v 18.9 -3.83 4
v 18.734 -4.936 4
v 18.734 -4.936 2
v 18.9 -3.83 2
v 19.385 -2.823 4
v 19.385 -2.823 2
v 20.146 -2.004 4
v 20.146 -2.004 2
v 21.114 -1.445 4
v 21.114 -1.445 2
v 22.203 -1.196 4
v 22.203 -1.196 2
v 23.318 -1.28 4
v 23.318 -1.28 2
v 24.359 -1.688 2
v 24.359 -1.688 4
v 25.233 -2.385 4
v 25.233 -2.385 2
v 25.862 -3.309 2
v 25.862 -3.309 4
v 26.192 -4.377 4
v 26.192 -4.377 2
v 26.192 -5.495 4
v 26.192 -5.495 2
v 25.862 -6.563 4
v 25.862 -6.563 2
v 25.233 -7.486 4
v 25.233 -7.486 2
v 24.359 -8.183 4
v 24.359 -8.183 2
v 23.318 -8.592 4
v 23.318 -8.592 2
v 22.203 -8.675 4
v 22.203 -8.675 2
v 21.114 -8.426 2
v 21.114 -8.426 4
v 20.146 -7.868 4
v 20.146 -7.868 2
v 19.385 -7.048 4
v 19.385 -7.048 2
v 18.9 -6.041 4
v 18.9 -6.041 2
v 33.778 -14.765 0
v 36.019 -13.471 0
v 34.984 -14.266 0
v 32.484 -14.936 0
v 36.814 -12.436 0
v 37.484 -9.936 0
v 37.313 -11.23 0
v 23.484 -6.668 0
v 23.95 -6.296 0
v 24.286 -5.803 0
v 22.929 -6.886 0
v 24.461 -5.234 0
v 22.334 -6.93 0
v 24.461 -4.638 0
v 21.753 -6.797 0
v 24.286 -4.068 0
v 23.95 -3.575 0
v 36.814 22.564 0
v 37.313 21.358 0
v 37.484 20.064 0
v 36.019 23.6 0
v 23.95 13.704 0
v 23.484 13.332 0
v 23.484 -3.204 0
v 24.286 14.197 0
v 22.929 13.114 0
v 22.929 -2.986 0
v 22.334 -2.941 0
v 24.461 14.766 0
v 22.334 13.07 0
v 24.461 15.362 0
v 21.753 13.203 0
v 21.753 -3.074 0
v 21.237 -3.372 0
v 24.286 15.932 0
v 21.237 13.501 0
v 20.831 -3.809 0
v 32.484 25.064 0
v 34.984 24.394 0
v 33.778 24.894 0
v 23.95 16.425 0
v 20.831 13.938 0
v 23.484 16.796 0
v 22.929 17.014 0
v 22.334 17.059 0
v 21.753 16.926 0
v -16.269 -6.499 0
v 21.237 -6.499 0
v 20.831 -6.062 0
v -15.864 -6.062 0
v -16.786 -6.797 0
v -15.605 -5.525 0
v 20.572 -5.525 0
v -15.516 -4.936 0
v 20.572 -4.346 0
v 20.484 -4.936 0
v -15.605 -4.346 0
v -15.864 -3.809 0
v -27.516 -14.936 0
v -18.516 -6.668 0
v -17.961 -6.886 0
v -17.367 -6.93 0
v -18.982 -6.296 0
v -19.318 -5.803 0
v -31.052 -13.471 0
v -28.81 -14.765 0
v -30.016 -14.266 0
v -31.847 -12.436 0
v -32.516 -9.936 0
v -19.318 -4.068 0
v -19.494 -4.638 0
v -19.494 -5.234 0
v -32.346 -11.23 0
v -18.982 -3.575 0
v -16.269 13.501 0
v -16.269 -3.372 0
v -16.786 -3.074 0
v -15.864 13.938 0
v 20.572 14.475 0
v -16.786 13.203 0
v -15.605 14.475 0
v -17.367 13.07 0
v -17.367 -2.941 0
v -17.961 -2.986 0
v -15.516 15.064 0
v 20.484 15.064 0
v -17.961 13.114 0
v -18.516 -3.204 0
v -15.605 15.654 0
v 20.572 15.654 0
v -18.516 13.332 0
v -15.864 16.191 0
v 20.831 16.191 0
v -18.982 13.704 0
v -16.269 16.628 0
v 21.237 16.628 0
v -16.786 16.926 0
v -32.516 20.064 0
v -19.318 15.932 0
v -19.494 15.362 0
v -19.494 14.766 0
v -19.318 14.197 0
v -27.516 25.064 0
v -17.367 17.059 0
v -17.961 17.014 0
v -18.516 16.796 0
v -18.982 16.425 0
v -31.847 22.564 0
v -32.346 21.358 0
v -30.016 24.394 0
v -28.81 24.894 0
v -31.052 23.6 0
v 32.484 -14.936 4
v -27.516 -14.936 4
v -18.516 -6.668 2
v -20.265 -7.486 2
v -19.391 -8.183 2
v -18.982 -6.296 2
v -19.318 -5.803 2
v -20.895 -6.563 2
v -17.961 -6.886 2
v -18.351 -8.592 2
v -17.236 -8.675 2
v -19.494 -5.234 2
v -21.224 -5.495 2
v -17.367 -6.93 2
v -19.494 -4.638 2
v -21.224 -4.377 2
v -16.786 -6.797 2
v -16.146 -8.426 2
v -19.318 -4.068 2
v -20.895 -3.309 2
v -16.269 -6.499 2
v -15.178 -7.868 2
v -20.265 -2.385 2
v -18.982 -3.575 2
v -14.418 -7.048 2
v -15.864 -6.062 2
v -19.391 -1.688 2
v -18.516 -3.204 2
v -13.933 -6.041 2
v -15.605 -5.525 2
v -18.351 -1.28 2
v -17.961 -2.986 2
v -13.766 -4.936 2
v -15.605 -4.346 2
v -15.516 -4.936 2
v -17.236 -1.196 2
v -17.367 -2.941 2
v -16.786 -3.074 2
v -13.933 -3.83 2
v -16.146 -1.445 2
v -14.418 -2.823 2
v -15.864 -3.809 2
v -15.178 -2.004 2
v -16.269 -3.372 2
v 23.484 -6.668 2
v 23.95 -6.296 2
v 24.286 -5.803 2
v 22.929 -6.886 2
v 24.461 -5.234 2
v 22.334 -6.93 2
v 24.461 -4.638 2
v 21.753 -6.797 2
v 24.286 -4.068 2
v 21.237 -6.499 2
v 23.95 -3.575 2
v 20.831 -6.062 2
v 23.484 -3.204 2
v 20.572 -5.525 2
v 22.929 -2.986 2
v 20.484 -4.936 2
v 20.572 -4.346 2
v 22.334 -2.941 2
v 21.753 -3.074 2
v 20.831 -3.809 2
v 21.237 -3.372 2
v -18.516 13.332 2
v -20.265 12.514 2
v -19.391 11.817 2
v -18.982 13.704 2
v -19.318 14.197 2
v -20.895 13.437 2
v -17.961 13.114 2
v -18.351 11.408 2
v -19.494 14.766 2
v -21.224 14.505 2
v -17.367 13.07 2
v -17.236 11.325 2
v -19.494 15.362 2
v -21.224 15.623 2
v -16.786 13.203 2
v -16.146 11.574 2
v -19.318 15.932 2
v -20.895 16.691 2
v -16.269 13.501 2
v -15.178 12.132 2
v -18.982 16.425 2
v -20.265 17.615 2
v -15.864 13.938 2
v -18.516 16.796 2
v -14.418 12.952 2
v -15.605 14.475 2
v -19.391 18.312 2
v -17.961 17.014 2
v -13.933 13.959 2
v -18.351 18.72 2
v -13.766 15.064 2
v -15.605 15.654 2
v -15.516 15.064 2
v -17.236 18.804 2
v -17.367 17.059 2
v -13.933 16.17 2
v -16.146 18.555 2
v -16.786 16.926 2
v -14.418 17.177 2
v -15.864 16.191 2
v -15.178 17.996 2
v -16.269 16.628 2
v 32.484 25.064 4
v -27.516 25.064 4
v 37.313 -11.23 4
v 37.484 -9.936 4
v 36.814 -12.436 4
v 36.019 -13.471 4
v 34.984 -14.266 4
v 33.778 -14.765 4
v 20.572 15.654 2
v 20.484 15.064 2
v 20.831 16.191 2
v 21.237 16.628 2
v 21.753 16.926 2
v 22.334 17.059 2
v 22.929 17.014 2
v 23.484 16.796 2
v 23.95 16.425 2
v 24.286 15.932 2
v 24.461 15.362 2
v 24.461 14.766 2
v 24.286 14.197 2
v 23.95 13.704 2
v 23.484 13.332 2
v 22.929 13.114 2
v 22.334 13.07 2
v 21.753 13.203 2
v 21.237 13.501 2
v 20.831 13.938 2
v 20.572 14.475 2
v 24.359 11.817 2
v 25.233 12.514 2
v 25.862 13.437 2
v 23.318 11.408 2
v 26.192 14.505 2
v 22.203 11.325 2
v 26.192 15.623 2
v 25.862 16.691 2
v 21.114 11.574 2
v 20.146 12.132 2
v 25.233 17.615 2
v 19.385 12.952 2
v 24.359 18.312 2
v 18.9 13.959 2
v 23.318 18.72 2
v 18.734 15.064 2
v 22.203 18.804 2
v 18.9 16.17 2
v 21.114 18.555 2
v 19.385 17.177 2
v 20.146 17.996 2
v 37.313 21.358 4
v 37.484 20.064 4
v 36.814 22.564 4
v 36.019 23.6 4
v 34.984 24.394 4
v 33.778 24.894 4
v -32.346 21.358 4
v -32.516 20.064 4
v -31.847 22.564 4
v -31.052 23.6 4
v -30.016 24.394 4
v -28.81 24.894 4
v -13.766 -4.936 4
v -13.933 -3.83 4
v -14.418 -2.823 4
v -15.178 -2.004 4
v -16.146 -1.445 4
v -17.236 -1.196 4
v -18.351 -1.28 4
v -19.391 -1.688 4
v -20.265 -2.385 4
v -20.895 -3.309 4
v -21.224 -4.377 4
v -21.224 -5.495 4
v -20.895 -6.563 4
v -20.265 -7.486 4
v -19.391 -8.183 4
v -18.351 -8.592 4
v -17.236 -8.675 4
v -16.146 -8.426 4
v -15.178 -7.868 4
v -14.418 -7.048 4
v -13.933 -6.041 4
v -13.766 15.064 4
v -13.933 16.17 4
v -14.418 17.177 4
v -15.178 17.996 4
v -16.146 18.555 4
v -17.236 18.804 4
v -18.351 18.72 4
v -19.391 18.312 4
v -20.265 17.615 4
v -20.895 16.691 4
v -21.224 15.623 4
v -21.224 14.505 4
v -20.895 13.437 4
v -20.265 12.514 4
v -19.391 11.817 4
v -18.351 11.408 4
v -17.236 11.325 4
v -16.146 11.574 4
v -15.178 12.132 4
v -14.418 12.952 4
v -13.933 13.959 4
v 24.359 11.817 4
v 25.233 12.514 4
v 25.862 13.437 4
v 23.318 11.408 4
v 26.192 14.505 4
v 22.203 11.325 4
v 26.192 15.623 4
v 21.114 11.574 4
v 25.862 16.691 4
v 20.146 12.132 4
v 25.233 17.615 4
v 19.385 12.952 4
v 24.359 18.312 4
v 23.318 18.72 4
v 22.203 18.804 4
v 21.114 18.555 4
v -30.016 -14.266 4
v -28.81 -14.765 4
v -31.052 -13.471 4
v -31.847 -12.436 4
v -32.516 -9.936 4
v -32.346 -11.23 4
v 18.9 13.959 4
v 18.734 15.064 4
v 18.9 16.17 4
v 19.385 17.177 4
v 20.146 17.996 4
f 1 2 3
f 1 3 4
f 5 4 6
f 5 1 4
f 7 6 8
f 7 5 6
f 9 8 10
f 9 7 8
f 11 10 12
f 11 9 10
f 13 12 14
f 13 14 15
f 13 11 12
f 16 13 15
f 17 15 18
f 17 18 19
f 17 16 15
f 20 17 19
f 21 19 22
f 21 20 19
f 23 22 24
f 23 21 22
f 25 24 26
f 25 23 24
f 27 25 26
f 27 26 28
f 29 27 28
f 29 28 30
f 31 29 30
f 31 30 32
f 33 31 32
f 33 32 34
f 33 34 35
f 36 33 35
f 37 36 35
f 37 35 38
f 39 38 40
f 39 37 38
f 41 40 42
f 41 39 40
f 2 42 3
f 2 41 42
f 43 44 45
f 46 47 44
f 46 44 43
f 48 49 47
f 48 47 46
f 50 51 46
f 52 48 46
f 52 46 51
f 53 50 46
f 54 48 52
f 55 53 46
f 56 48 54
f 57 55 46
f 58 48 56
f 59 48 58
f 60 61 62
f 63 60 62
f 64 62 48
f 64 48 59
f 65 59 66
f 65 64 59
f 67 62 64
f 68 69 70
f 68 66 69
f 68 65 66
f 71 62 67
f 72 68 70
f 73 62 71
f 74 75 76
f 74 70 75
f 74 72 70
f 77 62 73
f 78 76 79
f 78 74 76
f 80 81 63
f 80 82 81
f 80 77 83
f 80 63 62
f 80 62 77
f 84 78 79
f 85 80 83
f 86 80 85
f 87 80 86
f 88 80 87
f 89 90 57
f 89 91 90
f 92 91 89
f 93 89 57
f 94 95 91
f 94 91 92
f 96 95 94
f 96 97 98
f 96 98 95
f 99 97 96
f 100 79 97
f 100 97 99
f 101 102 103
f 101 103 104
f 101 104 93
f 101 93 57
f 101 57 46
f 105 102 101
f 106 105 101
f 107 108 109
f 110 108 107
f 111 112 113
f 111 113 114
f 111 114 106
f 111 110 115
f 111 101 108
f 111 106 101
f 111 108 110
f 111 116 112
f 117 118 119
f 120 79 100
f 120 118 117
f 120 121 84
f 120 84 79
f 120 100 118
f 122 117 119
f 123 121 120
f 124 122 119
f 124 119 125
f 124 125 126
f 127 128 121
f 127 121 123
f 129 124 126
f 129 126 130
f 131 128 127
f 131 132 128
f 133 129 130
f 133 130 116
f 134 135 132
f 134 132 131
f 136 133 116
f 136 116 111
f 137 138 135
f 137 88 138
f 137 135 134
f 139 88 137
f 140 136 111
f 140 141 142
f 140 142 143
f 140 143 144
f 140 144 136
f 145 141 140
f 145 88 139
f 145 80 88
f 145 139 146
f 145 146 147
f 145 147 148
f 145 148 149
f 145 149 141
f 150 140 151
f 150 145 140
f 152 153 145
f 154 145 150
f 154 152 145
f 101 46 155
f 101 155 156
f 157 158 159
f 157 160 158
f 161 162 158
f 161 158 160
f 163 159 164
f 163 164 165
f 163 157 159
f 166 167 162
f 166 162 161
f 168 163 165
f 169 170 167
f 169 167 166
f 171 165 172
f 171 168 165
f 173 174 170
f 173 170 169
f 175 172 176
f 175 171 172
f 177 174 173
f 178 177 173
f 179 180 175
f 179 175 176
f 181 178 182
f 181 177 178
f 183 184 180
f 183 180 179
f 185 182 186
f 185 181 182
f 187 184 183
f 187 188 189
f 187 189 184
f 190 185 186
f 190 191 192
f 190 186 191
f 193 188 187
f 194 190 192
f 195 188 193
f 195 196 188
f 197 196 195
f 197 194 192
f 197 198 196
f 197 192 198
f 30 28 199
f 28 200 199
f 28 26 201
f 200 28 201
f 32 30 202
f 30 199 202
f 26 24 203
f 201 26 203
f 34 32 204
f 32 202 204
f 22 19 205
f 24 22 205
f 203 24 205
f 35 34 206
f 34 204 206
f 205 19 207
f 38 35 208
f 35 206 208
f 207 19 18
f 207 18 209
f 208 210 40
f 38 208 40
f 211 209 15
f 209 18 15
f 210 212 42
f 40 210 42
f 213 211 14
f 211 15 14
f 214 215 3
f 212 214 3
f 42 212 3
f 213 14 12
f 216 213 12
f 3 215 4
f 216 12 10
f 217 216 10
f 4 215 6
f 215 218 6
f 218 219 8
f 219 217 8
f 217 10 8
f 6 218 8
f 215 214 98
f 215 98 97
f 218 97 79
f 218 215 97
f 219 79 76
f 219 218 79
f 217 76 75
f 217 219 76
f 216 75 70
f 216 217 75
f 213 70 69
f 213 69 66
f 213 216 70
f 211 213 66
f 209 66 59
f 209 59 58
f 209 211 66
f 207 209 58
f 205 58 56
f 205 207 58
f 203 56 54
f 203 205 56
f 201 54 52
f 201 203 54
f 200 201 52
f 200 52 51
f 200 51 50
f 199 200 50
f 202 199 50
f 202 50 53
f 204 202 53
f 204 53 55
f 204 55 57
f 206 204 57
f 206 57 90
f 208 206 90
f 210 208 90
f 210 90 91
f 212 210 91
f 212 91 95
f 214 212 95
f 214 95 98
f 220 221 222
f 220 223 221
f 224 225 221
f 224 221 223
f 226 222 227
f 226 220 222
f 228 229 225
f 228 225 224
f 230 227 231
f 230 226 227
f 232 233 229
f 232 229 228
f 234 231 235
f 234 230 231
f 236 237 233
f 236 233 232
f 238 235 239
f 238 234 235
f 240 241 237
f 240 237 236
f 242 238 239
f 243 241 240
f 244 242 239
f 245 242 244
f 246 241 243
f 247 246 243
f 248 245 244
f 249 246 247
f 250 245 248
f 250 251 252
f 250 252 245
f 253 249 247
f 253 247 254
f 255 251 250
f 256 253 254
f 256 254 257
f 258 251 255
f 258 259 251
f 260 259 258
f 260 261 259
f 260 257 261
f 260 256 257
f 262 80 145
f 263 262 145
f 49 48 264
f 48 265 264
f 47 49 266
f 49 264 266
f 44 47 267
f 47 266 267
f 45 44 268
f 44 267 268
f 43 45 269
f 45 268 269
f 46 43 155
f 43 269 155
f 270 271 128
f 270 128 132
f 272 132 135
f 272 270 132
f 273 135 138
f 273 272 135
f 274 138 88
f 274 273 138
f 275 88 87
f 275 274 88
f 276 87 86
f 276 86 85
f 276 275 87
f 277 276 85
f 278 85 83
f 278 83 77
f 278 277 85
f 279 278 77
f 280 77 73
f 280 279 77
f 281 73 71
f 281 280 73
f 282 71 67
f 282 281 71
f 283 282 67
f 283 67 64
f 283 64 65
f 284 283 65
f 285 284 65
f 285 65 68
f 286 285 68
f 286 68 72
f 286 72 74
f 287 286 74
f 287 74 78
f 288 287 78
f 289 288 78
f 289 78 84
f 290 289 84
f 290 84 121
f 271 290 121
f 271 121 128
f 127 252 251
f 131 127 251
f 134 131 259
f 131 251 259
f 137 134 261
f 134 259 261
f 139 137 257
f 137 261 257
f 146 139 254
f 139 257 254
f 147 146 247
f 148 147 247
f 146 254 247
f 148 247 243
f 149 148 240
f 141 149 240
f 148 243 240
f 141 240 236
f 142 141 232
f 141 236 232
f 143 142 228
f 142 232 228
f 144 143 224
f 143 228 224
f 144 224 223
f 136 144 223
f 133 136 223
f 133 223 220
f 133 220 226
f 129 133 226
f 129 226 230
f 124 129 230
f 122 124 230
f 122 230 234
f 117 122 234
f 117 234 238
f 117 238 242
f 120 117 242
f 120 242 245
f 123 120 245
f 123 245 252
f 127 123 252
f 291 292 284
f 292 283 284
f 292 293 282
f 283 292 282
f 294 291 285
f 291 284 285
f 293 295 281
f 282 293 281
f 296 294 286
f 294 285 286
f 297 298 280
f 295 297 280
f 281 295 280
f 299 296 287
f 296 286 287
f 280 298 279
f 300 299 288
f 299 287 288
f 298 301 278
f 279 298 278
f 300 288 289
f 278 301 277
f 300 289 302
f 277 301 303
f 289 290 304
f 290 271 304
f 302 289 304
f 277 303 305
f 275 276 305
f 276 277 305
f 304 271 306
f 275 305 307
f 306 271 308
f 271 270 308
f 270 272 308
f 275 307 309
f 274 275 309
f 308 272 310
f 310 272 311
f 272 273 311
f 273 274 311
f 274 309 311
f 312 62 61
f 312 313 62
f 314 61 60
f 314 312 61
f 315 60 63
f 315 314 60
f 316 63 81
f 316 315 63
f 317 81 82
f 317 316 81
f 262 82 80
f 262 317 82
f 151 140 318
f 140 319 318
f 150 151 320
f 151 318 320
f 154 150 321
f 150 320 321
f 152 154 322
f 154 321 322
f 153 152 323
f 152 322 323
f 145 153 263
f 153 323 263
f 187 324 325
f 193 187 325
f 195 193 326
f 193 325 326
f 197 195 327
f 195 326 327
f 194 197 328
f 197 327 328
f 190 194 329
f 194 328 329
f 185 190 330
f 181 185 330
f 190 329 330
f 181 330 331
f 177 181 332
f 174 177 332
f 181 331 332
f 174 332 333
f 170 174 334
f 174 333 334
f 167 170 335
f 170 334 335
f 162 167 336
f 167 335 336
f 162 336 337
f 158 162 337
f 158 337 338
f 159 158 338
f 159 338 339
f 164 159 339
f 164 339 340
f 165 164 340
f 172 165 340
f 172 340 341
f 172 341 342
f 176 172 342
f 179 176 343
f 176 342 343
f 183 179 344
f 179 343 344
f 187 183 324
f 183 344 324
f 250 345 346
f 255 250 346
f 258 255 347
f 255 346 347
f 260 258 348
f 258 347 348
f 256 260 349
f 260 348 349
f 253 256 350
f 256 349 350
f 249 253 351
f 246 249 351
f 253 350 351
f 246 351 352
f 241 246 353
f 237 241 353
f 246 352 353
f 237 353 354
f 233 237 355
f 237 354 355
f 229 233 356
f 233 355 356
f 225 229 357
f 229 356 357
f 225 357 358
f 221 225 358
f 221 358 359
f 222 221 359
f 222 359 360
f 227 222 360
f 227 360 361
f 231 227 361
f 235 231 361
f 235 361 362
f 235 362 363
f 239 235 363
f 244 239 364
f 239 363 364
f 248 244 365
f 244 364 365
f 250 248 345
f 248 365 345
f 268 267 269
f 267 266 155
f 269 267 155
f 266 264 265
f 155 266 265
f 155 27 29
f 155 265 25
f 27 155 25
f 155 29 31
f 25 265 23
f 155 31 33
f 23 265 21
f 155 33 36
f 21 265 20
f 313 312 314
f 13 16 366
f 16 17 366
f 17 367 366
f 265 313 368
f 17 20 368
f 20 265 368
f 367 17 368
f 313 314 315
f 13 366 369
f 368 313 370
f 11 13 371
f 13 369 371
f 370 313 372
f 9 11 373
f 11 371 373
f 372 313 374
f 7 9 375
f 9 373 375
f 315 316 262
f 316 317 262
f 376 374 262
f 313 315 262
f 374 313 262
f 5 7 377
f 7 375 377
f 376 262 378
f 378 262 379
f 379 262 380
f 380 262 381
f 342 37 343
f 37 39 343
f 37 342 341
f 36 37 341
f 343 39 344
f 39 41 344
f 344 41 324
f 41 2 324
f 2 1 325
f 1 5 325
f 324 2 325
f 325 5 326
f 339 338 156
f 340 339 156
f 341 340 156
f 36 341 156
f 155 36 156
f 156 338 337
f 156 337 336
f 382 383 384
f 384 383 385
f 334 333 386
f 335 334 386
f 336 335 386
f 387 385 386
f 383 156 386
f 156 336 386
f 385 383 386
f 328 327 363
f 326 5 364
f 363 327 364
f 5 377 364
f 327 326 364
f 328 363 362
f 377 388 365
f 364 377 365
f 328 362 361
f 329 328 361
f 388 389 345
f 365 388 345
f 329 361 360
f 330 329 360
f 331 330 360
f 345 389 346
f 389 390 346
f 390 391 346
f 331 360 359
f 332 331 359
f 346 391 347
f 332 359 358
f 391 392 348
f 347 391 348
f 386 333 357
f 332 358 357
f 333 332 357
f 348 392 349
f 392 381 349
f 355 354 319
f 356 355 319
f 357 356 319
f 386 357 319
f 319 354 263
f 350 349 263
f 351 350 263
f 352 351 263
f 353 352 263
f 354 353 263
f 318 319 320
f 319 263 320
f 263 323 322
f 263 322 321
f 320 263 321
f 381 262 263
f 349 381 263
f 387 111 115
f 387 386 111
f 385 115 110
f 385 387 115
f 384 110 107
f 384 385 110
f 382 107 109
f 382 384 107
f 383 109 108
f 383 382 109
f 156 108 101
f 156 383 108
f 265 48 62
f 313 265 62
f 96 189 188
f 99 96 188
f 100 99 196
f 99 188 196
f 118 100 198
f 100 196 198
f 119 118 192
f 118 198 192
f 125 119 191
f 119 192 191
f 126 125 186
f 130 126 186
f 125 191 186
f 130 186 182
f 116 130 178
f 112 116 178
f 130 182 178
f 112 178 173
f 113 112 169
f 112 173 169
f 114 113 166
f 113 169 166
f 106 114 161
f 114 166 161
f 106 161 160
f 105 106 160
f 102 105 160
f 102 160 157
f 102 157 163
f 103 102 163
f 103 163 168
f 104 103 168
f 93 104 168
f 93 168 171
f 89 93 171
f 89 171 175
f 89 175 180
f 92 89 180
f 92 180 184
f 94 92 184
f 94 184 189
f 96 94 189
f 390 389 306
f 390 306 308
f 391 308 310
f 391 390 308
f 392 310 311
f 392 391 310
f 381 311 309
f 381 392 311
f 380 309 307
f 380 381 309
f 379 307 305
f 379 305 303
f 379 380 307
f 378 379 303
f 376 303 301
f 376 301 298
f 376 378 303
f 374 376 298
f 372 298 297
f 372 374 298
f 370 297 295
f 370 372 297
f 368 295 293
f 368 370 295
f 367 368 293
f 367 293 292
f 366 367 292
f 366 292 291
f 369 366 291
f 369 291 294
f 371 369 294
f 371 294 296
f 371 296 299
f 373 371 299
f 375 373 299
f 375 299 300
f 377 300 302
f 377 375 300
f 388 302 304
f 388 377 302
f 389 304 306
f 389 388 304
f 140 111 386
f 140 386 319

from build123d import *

# Parameters (mm, degrees)
F0_W     = 35
F0_H     = 40
F1_DEPTH = 4
F2_R     = 5
F3_R     = 3.75
F4_DEPTH = 2
F5_R     = 2
F6_DEPTH = 5
F7_R     = 2
F8_DEPTH = 5


with BuildPart() as f1:
    # F0 (on Top) → F1 (new body)
    with BuildSketch(Plane.XY):
        with Locations((-15.016379, 5.064304)):
            Rectangle(F0_W, F0_H)
    extrude(amount=F1_DEPTH)

    # F2
    f2_edges = [f1.edges().sort_by_distance(p)[0] for p in [
        (-32.516379, 25.064304, 2),
        (-32.516379, -14.935696, 2),
    ]]
    fillet(f2_edges, radius=F2_R)

    # F3 (on face) → F4 (cut)
    with BuildSketch(Plane.XY.offset(4)):
        with Locations((-17.516379, -4.935696)):
            Circle(F3_R)
        with Locations((-17.516379, 15.064304)):
            Circle(F3_R)
    extrude(amount=-F4_DEPTH, mode=Mode.SUBTRACT)

    # F5 (on face) → F6 (cut)
    with BuildSketch(Plane.XY.offset(2)):
        with Locations((-17.516379, 15.064304)):
            Circle(F5_R)
    extrude(amount=-F6_DEPTH, mode=Mode.SUBTRACT)

    # F7 (on face) → F8 (cut)
    with BuildSketch(Plane.XY.offset(2)):
        with Locations((-17.516379, -4.935696)):
            Circle(F7_R)
    extrude(amount=-F8_DEPTH, mode=Mode.SUBTRACT)

    # F9: F1 across face


with BuildPart() as f1_1:
    add(f1.part)
    add(f1.part.mirror(Plane(origin=(2.483621, 5.064304, 2), x_dir=(0, 1, 0), z_dir=(1, 0, 0))))


solid = f1_1.part
